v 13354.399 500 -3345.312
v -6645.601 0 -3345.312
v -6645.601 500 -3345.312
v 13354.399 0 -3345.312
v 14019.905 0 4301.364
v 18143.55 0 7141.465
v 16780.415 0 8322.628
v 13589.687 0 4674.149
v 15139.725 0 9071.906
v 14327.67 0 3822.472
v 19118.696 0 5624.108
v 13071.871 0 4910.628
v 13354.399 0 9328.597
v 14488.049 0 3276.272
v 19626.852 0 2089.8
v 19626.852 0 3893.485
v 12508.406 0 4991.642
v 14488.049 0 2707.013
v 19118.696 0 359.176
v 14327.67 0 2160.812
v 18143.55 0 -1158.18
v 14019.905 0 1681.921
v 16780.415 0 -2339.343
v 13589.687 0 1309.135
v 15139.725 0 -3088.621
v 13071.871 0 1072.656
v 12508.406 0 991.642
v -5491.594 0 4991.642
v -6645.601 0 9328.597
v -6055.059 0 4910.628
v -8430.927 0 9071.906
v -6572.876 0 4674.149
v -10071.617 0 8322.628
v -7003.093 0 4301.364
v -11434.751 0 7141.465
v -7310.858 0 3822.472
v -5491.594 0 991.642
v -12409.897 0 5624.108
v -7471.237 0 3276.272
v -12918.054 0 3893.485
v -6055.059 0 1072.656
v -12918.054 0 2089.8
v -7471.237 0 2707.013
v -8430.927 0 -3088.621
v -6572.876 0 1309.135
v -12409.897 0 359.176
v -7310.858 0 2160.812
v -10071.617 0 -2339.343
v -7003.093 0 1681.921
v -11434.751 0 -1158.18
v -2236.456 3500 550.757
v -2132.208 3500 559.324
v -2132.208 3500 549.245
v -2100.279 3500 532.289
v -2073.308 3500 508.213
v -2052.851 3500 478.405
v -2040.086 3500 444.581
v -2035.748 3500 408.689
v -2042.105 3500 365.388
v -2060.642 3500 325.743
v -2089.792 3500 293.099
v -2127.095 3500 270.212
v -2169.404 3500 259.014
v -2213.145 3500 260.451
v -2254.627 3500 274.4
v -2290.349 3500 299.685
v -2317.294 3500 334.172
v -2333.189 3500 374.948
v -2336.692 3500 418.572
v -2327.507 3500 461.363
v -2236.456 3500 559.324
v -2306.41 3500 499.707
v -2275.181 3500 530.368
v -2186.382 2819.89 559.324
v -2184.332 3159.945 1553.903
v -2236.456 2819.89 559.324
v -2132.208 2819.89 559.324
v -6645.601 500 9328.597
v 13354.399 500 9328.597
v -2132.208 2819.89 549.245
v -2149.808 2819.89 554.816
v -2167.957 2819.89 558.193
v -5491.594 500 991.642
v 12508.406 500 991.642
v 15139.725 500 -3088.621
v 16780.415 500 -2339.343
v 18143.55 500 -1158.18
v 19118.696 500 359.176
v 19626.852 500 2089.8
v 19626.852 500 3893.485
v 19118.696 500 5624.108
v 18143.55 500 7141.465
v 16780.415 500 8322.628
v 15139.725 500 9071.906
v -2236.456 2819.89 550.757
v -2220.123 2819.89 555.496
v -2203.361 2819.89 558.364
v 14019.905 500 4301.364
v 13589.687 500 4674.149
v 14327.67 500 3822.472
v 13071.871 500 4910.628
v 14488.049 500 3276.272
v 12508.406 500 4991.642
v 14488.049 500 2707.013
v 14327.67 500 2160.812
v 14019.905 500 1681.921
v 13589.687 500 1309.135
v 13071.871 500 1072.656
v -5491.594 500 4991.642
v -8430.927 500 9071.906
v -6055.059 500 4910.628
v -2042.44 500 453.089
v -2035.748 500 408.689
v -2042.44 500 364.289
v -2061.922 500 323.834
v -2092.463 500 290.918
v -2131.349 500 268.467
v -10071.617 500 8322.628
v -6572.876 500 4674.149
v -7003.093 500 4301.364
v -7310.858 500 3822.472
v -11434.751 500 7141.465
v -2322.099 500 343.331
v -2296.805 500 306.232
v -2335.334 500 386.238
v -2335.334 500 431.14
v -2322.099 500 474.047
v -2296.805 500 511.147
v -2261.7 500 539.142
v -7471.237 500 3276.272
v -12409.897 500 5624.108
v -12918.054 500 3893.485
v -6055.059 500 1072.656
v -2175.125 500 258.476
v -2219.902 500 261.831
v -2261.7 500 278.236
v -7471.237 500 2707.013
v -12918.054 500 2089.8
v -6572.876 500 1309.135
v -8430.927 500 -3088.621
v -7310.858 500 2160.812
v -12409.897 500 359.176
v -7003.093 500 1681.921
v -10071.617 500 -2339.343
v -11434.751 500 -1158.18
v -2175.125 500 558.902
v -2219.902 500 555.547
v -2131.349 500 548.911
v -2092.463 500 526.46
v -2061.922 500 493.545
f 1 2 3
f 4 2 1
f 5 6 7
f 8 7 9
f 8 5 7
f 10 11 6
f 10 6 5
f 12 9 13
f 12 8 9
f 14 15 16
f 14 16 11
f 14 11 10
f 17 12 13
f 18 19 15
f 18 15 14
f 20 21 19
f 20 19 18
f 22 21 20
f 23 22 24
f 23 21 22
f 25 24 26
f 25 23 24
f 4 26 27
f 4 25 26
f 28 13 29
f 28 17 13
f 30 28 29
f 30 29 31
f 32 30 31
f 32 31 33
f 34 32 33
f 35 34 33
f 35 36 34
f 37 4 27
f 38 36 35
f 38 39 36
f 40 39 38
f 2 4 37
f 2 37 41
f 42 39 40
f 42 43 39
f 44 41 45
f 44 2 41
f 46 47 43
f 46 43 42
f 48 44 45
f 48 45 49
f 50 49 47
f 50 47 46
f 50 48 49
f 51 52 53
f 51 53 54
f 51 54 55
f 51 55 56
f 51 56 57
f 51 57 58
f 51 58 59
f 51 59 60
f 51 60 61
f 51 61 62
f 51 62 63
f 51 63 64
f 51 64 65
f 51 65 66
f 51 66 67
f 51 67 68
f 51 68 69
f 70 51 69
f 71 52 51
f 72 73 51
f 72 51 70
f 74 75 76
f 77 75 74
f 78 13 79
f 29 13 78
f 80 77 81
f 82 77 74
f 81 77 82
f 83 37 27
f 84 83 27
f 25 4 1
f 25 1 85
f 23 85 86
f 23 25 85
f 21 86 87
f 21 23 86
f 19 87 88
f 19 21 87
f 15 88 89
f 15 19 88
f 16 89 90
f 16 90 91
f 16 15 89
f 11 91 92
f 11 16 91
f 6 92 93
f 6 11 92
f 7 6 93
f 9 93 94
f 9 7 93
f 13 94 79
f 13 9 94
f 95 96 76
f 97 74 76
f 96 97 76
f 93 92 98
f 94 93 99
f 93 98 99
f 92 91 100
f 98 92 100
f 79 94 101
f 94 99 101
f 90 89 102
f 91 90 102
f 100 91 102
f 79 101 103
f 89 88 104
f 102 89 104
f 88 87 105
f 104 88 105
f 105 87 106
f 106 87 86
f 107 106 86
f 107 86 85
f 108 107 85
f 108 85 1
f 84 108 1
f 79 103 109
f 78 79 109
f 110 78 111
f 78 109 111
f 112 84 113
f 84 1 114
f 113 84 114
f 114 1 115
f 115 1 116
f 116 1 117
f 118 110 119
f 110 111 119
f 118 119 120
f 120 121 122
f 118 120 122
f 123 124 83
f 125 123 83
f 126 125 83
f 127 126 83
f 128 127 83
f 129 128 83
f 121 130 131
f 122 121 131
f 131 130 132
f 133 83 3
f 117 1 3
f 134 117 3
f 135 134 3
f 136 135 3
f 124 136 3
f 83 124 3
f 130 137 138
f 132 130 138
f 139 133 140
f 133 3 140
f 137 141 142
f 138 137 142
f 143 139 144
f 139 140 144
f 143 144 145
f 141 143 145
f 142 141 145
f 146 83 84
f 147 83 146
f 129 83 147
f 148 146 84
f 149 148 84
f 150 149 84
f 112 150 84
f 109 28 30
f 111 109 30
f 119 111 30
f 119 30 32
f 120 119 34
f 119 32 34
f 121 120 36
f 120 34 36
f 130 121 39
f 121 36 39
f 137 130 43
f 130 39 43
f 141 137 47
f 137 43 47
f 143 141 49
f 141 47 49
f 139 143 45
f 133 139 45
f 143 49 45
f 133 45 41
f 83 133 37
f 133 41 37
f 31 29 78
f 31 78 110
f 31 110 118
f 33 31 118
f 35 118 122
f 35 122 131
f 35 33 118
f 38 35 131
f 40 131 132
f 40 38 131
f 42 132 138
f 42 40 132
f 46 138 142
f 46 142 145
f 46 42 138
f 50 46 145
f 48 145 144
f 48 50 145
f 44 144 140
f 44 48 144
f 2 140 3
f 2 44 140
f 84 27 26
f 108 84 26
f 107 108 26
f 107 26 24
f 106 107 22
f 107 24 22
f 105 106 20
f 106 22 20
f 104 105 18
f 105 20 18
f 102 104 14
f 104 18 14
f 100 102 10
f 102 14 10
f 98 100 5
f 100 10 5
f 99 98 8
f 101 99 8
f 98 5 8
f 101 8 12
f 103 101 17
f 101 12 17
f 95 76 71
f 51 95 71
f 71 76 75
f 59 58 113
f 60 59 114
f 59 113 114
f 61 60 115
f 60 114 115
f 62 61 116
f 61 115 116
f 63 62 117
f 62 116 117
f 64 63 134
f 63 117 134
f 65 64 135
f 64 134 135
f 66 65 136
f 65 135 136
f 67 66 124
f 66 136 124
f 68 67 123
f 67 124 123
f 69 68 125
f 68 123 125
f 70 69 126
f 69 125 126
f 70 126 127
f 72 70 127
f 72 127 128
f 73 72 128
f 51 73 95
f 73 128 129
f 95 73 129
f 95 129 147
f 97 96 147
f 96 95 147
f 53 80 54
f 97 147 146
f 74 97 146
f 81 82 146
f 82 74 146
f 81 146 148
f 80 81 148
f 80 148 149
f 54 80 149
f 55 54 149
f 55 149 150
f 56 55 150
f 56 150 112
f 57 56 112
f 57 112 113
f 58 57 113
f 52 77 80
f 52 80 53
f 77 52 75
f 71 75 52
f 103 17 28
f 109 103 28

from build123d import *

# Parameters (mm, degrees)
BOSS_EXTRUDE1_DEPTH = 500
SKETCH5_R           = 150.634589438
BOSS_EXTRUDE4_DEPTH = 3000
SKETCH6_W           = 104.247390594
SKETCH6_H           = 680.109536147
BOSS_EXTRUDE5_DEPTH = 1000
BOSS_EXTRUDE5_TAPER = 3
CUT_EXTRUDE1_DEPTH  = 1000
SKETCH9_W           = 104.247390594
SKETCH9_H           = 680.109536147
BOSS_EXTRUDE6_DEPTH = 50


with BuildPart() as part:
    # Sketch1 → Boss-Extrude1 (new body)
    with BuildSketch(Plane(origin=(0, 0, 0), x_dir=(1, 0, 0), z_dir=(0, 1, 0))):
        with BuildLine():
            Line((-6645.600859059, 3345.311870775), (13354.399140941, 3345.311870775))
            ThreePointArc((13354.399140941, 3345.311870775), (19691.353441646, -2991.642429929), (13354.399140941, -9328.596730634))
            Line((13354.399140941, -9328.596730634), (-6645.600859059, -9328.596730634))
            ThreePointArc((-6645.600859059, -9328.596730634), (-12982.555159763, -2991.642429929), (-6645.600859059, 3345.311870775))
        make_face()
        with BuildLine():
            Line((-5491.594317378, -991.642429929), (12508.405682622, -991.642429929))
            ThreePointArc((12508.405682622, -991.642429929), (14508.405682622, -2991.642429929), (12508.405682622, -4991.642429929))
            Line((12508.405682622, -4991.642429929), (-5491.594317378, -4991.642429929))
            ThreePointArc((-5491.594317378, -4991.642429929), (-7491.594317378, -2991.642429929), (-5491.594317378, -991.642429929))
        make_face(mode=Mode.SUBTRACT)
    extrude(amount=BOSS_EXTRUDE1_DEPTH)

    # Sketch5 → Boss-Extrude4 (add)
    with BuildSketch(Plane(origin=(0, 500, 0), x_dir=(1, 0, 0), z_dir=(0, 1, 0))):
        with Locations((-2186.382335194, -408.689063218)):
            Circle(SKETCH5_R)
    extrude(amount=BOSS_EXTRUDE4_DEPTH)



with BuildPart() as body_2:
    # Sketch6 → Boss-Extrude5 (new body)
    with BuildSketch(Plane.XY.offset(559.323652656)):
        with Locations((-2184.332083006, 3159.945231927)):
            Rectangle(SKETCH6_W, SKETCH6_H)
    extrude(amount=BOSS_EXTRUDE5_DEPTH, taper=BOSS_EXTRUDE5_TAPER)

    # Sketch8 → Cut-Extrude1 (cut)
    with BuildSketch(Plane(origin=(-2035.747745755, 0, 0), x_dir=(0, 0, -1), z_dir=(1, 0, 0))):
        Polygon((-559.323652656, 3500), (-1553.903007293, 3447.876304703), (-1553.903007293, 3159.945231926), align=None)
        Polygon((-1553.903007293, 2872.01415915), (-1553.903007293, 3159.945231926), (-559.323652656, 2819.890463853), align=None)
    extrude(amount=-CUT_EXTRUDE1_DEPTH, mode=Mode.SUBTRACT)


with BuildPart() as part_1:
    add(part.part)

    add(body_2.part)  # Boss-Extrude6 merges body 2
    # Sketch9 → Boss-Extrude6 (add)
    with BuildSketch(Plane(origin=(0, 0, 559.323652656), x_dir=(-1, 0, 0), z_dir=(0, 0, -1))):
        with Locations((2184.332083006, 3159.945231927)):
            Rectangle(SKETCH9_W, SKETCH9_H)
    extrude(amount=BOSS_EXTRUDE6_DEPTH)


solid = part_1.part
